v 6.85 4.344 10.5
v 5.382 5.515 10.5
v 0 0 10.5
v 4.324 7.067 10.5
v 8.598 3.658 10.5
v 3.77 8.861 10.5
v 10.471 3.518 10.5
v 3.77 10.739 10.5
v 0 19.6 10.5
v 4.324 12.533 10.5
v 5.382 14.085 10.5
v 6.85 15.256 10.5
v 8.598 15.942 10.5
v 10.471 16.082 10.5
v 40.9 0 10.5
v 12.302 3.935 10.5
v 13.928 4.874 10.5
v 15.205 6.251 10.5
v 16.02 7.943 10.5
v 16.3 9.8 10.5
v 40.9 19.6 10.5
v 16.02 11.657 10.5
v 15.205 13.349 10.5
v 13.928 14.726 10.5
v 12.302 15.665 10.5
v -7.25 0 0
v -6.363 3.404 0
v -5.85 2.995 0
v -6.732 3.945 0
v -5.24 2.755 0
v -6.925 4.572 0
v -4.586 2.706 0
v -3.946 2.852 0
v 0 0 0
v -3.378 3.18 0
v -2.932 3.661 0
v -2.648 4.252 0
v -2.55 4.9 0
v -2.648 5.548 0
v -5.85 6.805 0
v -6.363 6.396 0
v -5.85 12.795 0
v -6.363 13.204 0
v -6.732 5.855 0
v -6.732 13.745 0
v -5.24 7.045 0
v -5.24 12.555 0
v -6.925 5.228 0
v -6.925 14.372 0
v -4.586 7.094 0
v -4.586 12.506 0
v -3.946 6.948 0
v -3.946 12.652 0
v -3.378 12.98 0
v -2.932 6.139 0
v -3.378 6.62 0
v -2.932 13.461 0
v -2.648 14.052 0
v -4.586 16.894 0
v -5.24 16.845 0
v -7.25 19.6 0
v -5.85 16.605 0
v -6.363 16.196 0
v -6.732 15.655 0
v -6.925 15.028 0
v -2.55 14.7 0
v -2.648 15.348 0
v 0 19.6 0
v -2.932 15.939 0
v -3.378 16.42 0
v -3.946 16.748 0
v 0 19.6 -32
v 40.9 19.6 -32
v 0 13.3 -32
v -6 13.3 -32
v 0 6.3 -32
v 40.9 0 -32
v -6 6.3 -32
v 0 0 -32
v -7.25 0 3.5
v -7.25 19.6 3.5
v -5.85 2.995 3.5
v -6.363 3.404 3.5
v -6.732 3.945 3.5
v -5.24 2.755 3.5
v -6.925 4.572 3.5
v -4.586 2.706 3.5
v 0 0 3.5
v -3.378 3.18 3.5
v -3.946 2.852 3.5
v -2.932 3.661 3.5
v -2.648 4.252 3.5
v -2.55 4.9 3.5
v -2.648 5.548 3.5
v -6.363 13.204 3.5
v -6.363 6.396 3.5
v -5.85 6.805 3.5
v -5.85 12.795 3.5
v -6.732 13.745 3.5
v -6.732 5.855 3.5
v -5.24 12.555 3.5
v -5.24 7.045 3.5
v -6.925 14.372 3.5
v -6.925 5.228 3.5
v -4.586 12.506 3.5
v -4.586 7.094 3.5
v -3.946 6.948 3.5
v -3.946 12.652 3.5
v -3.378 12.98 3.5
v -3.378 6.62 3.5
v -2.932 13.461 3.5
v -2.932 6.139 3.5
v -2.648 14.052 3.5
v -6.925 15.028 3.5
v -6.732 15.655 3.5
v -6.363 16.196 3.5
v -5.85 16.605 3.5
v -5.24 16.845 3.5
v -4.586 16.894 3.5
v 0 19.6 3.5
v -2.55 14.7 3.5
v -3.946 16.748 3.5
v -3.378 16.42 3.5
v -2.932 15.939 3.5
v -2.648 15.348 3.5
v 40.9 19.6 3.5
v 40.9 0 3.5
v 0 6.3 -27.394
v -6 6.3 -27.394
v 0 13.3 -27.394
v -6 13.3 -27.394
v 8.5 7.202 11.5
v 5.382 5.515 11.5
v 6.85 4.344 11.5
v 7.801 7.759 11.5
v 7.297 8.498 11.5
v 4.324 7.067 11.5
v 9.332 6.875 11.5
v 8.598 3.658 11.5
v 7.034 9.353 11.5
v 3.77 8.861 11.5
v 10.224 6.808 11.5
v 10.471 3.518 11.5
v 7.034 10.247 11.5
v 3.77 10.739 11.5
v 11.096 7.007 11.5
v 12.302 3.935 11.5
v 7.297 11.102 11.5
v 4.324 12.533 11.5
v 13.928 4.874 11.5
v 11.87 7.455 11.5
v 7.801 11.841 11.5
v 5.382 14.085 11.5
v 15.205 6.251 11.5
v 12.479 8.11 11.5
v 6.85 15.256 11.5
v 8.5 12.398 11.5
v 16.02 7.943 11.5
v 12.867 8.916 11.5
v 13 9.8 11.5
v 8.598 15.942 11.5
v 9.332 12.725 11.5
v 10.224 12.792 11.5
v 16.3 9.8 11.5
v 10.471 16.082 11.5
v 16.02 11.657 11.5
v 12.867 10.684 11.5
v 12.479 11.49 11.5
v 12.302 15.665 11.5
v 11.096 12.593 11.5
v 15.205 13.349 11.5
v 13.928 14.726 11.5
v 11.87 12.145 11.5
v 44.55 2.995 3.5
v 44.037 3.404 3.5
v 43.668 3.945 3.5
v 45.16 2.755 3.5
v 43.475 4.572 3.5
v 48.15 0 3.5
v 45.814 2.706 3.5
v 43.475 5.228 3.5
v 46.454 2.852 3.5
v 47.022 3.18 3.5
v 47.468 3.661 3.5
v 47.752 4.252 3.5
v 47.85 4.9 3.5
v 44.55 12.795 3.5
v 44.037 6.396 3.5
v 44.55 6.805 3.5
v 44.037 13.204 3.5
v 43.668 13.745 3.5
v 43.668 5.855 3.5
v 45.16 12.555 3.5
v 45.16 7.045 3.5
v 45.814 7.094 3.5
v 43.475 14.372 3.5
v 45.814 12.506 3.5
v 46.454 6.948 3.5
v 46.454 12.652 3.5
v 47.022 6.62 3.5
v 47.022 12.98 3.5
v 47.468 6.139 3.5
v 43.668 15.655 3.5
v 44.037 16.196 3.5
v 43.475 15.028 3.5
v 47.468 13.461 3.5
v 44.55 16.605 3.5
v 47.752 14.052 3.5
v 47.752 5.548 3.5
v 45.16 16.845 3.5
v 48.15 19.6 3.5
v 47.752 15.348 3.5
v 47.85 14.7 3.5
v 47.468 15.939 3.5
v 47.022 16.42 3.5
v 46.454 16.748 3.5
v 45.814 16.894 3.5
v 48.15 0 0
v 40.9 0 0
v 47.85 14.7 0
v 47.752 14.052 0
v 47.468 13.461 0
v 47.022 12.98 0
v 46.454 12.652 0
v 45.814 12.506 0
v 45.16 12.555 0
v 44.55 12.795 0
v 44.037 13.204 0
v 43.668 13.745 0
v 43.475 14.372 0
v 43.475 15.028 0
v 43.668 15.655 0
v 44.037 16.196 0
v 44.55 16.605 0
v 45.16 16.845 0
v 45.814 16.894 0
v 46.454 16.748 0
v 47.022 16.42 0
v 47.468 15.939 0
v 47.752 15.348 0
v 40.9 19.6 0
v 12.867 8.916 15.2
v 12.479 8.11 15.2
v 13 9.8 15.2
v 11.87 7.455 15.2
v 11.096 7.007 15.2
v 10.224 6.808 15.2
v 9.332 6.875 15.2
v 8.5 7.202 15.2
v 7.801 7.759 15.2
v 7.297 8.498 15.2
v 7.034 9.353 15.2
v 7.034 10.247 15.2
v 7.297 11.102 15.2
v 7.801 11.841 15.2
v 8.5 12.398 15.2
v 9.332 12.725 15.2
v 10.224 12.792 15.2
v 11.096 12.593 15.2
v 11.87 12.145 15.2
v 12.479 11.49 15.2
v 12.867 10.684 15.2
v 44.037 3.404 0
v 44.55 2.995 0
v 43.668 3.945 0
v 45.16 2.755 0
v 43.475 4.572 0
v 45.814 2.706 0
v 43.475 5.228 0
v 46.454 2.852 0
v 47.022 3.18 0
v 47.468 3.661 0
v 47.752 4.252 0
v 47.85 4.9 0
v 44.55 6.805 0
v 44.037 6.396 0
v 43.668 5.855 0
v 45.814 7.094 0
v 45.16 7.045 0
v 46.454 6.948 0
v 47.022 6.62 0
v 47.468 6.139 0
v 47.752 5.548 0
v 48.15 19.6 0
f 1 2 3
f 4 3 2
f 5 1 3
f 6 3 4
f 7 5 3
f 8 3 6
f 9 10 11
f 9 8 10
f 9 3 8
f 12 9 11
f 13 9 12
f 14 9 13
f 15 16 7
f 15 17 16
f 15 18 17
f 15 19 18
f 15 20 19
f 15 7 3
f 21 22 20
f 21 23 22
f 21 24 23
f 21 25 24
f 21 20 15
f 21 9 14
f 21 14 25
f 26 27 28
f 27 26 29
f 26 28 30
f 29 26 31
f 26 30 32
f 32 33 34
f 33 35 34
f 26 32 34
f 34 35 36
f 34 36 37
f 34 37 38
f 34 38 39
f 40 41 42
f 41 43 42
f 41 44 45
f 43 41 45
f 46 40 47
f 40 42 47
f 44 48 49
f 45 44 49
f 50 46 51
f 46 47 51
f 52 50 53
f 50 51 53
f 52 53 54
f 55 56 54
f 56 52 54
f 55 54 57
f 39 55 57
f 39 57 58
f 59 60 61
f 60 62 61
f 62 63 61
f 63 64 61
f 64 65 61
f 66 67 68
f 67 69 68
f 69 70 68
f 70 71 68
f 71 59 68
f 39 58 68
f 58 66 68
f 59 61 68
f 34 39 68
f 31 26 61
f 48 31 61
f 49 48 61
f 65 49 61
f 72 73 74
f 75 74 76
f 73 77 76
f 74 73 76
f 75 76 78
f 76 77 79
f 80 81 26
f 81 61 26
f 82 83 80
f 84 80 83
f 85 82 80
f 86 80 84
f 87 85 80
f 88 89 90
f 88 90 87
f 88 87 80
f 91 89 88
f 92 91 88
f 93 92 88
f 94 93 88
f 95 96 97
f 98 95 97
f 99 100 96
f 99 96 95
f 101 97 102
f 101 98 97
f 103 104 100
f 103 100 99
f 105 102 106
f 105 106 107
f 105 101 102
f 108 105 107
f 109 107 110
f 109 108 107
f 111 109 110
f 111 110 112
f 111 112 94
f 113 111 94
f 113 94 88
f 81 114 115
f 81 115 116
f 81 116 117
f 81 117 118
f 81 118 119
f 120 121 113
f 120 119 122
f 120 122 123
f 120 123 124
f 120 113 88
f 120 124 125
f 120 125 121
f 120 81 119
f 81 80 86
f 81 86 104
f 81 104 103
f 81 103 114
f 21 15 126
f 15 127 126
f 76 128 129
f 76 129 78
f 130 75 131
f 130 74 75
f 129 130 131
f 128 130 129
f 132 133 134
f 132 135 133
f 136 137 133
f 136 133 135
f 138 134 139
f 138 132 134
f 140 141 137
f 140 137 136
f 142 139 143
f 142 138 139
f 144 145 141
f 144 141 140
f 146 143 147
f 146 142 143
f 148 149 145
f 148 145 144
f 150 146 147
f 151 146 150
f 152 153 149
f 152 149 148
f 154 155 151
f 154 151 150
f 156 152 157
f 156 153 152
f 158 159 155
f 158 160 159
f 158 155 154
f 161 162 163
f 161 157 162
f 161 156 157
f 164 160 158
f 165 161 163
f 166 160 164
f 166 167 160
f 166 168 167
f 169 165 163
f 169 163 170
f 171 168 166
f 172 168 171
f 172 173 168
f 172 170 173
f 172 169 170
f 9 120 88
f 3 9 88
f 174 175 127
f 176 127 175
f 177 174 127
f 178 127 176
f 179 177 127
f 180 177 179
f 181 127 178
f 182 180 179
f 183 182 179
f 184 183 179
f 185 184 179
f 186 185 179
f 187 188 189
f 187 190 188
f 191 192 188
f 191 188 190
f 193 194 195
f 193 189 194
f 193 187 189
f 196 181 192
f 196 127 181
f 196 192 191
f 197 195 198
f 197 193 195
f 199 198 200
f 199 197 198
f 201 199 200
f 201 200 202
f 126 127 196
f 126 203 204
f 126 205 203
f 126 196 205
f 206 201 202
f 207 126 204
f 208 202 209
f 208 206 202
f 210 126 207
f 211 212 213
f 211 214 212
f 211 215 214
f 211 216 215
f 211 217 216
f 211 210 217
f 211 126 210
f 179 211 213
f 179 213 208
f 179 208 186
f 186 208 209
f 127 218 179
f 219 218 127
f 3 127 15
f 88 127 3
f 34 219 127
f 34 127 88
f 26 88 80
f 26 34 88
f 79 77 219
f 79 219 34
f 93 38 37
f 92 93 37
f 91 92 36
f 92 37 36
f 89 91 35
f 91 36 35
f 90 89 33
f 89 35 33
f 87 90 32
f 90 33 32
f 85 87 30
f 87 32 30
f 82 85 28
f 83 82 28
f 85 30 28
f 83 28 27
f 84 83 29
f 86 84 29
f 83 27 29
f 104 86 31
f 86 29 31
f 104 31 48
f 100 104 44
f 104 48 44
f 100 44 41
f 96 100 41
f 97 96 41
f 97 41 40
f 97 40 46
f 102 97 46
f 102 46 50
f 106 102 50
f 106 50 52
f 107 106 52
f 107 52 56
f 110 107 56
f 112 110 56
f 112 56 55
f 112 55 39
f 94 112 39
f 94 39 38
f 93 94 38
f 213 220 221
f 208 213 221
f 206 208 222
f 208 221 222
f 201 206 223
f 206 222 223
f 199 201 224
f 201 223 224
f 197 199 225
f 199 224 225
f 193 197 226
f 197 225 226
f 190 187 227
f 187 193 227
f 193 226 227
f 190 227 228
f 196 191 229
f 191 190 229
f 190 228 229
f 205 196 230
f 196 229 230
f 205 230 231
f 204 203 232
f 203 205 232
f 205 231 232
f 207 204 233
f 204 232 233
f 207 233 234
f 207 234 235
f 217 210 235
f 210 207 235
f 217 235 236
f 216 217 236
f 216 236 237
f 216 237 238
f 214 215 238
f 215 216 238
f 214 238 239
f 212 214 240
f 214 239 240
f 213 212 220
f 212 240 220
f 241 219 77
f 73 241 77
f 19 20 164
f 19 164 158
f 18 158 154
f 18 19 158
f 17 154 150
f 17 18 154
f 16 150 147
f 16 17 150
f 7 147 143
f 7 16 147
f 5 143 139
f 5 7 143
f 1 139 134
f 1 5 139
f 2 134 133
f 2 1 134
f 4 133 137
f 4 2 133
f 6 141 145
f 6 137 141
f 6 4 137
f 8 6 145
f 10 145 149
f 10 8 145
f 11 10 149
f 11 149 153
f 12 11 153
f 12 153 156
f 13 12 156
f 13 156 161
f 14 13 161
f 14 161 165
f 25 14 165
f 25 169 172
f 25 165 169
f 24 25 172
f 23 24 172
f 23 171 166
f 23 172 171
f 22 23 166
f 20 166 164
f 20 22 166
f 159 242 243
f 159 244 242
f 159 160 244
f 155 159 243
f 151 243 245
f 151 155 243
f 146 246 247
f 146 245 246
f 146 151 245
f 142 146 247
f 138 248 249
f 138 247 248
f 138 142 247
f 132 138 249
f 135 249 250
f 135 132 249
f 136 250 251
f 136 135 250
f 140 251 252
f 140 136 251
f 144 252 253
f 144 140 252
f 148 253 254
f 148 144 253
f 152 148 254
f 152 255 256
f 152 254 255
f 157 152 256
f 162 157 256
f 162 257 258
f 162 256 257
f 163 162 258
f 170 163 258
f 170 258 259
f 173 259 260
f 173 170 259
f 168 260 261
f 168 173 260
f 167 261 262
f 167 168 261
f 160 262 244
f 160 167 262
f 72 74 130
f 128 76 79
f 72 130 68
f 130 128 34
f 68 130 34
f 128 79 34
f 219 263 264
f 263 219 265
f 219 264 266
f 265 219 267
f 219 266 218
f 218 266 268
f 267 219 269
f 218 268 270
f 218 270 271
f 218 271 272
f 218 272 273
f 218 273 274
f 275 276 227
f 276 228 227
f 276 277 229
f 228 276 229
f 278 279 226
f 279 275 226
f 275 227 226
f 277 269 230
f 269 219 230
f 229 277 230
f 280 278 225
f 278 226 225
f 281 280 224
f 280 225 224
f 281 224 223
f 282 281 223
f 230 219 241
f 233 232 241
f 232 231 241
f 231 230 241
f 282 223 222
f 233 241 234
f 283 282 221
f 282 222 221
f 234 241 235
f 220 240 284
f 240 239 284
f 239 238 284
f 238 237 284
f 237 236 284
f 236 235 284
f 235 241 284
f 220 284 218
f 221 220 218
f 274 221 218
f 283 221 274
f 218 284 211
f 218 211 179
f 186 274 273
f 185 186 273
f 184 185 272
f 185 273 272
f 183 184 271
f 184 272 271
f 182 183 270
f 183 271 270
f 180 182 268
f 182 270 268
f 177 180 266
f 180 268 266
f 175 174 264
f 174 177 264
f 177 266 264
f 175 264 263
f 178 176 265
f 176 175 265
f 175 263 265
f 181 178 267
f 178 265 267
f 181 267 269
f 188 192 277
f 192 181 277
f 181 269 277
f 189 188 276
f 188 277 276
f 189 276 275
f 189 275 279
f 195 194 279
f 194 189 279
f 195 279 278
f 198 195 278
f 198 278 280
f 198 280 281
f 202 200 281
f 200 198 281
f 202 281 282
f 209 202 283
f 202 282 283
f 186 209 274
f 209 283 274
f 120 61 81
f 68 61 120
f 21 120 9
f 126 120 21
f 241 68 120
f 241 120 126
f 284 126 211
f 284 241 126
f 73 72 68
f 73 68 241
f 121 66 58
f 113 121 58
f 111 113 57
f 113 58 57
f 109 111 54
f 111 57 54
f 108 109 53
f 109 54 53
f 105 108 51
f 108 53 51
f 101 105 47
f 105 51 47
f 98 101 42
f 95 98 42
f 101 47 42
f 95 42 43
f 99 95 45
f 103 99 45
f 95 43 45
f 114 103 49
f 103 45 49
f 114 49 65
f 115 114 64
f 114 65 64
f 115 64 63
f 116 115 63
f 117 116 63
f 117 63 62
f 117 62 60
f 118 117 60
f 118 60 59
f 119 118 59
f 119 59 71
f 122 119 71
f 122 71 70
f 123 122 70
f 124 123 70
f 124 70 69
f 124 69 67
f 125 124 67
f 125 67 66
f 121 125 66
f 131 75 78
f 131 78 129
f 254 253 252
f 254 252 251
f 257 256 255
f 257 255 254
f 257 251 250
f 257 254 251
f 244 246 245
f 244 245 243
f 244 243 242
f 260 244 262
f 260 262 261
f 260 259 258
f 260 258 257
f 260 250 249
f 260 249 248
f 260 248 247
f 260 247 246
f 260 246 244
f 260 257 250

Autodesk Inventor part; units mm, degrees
ref_plane "YZ Plane" through (0, 0, 0) normal (1, 0, 0) x (0, 1, 0)
ref_plane "XZ Plane" through (0, 0, 0) normal (0, 1, 0) x (-1, 0, 0)
ref_plane "XY Plane" through (0, 0, 0) normal (0, 0, 1) x (1, 0, 0)
sketch "Boceto1" plane through (0, 0, 0) normal (0, 1, 0) x (-1, 0, 0)
  line L0 (0, 0) -> (-40.9, 0)
  line L1 (-40.9, 0) -> (-40.9, -32)
  line L2 (-40.9, -32) -> (0, -32)
  line L3 (0, -32) -> (0, 0)
  dimension "d0" = 40.9
  dimension "d1" = 32
extrude "Extrusión1" add sketch "Boceto1" along normal blind 19.6
sketch "Boceto2" plane through (0, 0, 0) normal (0, 0, 1) x (1, 0, 0)
  line L0 (20.45, 29.4794) -> (20.45, -8.3561)
  line L1 (0, 0) -> (0, 19.6) projected
  line L2 (0, 0) -> (0, 19.6) projected
  line L3 (20.45, 19.6) -> (-7.25, 19.6)
  line L4 (-7.25, 19.6) -> (-7.25, 0)
  line L5 (-7.25, 0) -> (20.45, 0)
  line L6 (0, 19.6) -> (40.9, 19.6) projected
  line L7 (0, 0) -> (40.9, 0) projected
  line L8 (-4.75, 38.1258) -> (-4.75, -18.5214)
  line L9 (50.1495, 9.8) -> (-24.2217, 9.8)
  circle A0 centre (-4.75, 14.7) radius 2.2
  circle A1 centre (-4.75, 4.9) radius 2.2
  line L10 (20.45, 0) -> (0, 0)
  line L11 (40.9, 19.6) -> (0, 19.6)
  line L12 (20.45, 0) -> (40.9, 0)
  line L13 (20.45, 19.6) -> (48.15, 19.6)
  line L14 (48.15, 19.6) -> (48.15, 0)
  line L15 (48.15, 0) -> (20.45, 0)
  circle A2 centre (45.65, 14.7) radius 2.2
  circle A3 centre (45.65, 4.9) radius 2.2
  dimension "d9" = 19.6
  dimension "d10" = 4.4
  dimension "d11" = 9.8
  dimension "d13" = 55.4
  dimension "d14" = 40.9
  dimension "d16" = 25.2
extrude "Extrusión2" add sketch "Boceto2" along normal blind 3.5 contours L6 L13 L14 L9 L0 | L0 L9 L1 L3 | L9 L14 L15 L7 L0 | L0 L5 L1 L9 | L1 L9 L8 A0 L3 | L1 L5 L8 A1 L9 | L8 A0 L9 L4 L3 | L8 A1 L5 L4 L9
sketch "Boceto3" plane through (0, 0, 3.5) normal (0, 0, 1) x (1, 0, 0)
  line L0 (0, 0) -> (40.9, 0)
  line L1 (40.9, 0) -> (40.9, 19.6)
  line L2 (40.9, 19.6) -> (0, 19.6)
  line L3 (0, 19.6) -> (0, 0)
extrude "Extrusión3" add sketch "Boceto3" along normal blind 7
sketch "Boceto4" plane through (0, 0, 10.5) normal (0, 0, 1) x (1, 0, 0)
  circle A0 centre (10, 9.8) radius 6.3
  line L0 (0, 0) -> (40.9, 0) projected
  line L1 (0, 19.6) -> (0, 0) projected
  dimension "d21" = 12.6
  dimension "d22" = 9.8
  dimension "d23" = 10
extrude "Extrusión4" add sketch "Boceto4" along normal blind 1
sketch "Boceto5" plane through (10, 9.8, 11.5) normal (0, 0, 1) x (1, 0, 0)
  circle A0 centre (0, 0) radius 3
  circle A1 centre (0, 0) radius 6.3 projected
  point P0 (-10, -9.8)
  dimension "d26" = 6
extrude "Extrusión5" add sketch "Boceto5" along normal blind 3.7 contours A0
sketch "Boceto6" plane through (0, 0, -32) normal (-1, 0, 0) x (0, 0, 1)
  line L0 (0, 0) -> (0, 19.6) projected
  line L1 (0, 13.3) -> (4.6057, 13.3)
  line L2 (4.6057, 13.3) -> (4.6057, 6.3)
  line L3 (4.6057, 6.3) -> (0, 6.3)
  line L4 (0, 6.3) -> (0, 13.3)
  line L5 (0, 19.6) -> (32, 19.6) projected
  line L6 (0, 0) -> (32, 0) projected
  dimension "d29" = 7
  dimension "d30" = 6.3
  dimension "d31" = 6.3
extrude "Extrusión6" add sketch "Boceto6" along normal blind 6
properties part number "savox"
